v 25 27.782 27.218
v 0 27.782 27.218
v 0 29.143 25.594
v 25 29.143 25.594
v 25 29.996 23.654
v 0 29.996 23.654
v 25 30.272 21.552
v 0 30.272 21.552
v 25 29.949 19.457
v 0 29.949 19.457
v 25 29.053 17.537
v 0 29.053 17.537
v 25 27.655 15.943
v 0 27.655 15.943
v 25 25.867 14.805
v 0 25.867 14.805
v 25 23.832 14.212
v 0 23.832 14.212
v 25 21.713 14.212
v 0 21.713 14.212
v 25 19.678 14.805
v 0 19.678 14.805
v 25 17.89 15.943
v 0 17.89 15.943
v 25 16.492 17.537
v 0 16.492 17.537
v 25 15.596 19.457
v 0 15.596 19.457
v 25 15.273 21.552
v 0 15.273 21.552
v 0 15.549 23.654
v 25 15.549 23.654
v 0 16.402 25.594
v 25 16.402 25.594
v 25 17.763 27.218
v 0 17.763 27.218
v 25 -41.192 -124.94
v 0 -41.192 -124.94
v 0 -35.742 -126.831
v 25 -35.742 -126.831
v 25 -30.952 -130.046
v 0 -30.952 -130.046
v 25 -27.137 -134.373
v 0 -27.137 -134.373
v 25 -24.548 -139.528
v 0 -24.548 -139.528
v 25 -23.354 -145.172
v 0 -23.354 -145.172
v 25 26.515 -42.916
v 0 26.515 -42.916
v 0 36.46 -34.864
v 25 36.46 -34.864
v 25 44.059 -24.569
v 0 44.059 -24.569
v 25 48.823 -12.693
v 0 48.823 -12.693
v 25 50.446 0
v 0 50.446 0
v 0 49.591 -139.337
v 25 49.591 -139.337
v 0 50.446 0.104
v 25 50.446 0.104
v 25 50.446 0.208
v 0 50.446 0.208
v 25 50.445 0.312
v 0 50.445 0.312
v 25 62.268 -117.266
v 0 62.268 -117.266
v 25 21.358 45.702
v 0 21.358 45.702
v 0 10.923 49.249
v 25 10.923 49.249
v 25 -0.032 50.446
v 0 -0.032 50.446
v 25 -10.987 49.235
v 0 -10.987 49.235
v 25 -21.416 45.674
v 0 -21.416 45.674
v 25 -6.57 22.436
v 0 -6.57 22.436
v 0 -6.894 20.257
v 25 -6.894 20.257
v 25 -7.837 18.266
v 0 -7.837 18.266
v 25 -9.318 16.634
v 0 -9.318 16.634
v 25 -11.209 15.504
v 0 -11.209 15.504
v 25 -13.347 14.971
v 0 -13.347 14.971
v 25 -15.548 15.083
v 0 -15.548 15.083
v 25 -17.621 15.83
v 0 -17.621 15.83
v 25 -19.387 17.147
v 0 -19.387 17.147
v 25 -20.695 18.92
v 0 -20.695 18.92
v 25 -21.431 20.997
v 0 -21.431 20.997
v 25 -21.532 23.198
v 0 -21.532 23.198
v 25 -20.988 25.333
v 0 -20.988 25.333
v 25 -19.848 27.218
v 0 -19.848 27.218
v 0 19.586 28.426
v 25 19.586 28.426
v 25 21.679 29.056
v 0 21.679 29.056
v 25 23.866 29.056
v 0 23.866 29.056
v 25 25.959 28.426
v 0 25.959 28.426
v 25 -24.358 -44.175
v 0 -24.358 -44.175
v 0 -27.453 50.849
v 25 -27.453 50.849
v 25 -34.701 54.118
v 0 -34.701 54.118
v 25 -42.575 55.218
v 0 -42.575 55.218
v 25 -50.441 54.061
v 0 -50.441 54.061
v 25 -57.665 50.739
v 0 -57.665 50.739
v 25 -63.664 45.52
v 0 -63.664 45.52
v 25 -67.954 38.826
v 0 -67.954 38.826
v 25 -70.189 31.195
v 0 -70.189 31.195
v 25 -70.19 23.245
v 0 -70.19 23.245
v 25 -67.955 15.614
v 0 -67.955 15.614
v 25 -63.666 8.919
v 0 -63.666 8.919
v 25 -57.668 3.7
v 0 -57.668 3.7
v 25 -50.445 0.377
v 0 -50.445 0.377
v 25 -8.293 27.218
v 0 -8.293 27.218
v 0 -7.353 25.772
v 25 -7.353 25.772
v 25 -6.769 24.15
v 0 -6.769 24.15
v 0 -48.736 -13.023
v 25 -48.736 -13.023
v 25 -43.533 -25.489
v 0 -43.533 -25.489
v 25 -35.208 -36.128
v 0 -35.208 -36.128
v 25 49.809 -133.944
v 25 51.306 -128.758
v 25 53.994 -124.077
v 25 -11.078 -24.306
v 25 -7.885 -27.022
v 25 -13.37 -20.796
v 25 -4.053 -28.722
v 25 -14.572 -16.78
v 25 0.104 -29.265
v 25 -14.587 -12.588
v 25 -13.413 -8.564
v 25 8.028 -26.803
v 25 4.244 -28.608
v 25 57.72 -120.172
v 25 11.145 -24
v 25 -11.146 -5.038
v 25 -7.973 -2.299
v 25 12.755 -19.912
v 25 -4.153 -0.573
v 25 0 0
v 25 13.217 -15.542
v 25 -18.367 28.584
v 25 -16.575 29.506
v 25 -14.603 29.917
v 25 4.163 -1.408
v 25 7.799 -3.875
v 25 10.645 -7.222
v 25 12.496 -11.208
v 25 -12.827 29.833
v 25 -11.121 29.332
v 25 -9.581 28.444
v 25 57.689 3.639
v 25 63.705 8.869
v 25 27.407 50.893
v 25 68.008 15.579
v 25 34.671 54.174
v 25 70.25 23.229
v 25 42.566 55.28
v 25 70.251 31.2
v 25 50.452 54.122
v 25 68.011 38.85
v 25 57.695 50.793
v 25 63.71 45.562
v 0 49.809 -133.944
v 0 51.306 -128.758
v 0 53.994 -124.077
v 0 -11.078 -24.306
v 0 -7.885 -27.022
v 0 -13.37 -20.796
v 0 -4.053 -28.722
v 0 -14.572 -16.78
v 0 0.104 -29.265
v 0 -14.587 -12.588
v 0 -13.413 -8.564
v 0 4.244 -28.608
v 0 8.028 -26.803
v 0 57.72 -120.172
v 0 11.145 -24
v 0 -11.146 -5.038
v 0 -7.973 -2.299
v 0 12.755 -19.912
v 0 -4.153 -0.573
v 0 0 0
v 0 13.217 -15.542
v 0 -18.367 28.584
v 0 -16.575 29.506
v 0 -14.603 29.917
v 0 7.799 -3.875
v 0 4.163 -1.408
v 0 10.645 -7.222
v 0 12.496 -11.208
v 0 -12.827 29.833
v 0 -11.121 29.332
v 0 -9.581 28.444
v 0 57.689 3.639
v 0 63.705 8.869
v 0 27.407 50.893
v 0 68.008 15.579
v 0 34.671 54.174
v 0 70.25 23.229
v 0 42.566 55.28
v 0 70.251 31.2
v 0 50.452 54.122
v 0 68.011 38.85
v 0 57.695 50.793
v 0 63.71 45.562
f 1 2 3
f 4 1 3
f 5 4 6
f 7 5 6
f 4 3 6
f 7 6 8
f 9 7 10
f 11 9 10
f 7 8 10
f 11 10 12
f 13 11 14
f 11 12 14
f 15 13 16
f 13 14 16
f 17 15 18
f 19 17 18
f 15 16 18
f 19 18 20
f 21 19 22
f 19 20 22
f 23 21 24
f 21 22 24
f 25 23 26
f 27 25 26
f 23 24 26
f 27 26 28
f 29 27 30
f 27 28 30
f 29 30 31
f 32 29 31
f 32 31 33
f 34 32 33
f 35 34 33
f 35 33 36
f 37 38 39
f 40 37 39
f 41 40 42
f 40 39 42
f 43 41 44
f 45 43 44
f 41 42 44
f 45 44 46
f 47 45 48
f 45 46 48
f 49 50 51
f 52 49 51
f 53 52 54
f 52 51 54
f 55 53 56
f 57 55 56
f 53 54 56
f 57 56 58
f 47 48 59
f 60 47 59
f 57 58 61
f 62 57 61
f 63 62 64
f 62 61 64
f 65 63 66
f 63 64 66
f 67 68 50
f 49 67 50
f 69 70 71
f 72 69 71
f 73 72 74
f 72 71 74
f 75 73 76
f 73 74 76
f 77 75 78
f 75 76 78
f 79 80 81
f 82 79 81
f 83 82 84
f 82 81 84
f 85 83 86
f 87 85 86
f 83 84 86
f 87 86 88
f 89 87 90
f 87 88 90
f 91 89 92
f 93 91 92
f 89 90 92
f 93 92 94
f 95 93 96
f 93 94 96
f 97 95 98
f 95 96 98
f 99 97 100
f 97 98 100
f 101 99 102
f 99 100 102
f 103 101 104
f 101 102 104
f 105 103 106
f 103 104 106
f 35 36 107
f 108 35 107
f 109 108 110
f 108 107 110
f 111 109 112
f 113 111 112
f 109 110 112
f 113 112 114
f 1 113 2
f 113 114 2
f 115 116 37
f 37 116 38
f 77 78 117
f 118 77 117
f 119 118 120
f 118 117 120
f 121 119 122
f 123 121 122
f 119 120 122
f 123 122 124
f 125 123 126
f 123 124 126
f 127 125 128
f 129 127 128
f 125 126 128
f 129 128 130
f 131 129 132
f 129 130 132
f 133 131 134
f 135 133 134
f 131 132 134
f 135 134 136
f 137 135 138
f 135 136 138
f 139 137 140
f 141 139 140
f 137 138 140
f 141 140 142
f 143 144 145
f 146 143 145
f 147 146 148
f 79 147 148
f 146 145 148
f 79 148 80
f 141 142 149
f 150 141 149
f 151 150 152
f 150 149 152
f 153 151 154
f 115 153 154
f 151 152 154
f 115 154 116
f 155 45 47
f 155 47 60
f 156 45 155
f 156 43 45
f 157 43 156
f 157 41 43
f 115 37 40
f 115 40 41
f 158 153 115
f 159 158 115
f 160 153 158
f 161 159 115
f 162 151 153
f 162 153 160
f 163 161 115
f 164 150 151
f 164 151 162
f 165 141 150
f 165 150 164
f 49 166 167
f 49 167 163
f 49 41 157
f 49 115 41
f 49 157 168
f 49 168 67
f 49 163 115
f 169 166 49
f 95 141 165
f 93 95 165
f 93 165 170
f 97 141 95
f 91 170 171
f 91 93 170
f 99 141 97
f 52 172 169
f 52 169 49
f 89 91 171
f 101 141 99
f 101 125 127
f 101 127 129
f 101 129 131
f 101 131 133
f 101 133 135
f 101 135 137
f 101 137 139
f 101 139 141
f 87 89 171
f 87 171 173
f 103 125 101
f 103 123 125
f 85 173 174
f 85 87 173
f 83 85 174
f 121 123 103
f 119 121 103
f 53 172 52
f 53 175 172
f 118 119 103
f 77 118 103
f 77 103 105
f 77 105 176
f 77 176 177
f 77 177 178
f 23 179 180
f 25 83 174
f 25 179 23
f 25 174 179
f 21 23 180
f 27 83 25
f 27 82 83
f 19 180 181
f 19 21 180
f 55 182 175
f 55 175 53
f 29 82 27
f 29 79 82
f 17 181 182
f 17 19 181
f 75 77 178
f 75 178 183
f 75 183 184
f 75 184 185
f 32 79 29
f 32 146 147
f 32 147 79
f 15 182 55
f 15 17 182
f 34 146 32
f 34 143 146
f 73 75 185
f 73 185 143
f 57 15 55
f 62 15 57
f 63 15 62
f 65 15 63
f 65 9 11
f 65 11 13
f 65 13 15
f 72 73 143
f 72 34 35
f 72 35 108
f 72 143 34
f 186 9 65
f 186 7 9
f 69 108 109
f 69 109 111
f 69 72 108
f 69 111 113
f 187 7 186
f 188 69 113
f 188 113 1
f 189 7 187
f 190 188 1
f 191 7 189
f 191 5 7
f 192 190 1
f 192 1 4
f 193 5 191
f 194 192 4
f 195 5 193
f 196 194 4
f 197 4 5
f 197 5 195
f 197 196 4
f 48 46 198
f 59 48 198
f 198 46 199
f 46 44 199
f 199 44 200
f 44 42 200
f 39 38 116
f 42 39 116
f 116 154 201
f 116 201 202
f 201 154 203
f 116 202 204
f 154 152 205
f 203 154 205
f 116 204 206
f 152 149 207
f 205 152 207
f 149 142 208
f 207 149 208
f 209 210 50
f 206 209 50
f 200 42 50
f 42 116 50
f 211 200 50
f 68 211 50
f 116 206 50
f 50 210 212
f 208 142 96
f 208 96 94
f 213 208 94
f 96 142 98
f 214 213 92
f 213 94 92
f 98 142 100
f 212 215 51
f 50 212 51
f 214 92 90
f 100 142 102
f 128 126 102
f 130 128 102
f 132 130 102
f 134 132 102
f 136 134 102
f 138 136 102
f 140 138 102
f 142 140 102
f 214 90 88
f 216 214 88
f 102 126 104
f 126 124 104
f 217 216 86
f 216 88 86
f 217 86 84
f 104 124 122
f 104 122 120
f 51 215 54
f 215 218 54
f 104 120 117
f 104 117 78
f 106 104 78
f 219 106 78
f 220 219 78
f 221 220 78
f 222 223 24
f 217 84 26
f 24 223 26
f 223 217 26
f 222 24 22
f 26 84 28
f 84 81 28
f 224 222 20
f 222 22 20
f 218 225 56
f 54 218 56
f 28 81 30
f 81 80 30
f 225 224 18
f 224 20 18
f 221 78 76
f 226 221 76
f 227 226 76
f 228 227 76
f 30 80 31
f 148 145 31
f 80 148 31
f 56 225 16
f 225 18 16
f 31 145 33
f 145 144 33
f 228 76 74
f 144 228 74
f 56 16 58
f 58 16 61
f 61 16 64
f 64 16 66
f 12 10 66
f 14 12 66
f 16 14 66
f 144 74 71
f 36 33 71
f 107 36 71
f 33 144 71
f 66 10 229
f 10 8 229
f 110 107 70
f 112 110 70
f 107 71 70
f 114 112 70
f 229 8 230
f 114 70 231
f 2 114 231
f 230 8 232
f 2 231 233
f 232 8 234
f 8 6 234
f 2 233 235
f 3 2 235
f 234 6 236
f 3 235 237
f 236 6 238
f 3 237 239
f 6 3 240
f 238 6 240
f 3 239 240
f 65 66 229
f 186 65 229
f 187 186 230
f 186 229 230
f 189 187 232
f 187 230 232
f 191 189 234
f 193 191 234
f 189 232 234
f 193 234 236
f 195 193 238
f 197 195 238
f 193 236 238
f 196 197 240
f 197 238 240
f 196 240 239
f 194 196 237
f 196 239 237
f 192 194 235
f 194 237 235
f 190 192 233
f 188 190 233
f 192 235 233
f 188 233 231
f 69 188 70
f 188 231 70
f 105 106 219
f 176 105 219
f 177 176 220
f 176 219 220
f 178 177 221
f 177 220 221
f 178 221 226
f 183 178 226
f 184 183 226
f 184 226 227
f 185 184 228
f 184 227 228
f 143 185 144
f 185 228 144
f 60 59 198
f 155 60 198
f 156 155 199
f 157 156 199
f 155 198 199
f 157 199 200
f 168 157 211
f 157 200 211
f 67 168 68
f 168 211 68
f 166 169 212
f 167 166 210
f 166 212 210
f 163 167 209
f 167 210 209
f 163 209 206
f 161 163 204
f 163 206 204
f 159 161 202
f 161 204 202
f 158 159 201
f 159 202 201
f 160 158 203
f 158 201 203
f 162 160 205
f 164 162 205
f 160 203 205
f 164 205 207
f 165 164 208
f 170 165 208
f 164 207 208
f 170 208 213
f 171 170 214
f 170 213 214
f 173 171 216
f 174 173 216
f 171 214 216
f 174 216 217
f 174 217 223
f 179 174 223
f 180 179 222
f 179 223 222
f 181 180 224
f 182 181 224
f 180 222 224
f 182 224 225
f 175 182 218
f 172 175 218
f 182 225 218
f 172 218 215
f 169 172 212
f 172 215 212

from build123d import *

# Parameters (mm, degrees)
F1_DEPTH = 25


with BuildPart() as f1:
    # F0 (on Right) → F1 (new body)
    with BuildSketch(Plane.YZ):
        with BuildLine():
            Line((62.268494035, -117.2657224541), (26.5148173721, -42.9157082976))
            ThreePointArc((26.5148173721, -42.9157082976), (1.2487643575, -50.4304882639), (-24.3582585984, -44.1754320523))
            Line((-24.3582585984, -44.1754320523), (-41.1918519377, -124.9397814602))
            ThreePointArc((-41.1918519377, -124.9397814602), (-28.905337679, -132.0868997864), (-23.3544766233, -145.1722990748))
            Line((-23.3544766233, -145.1722990748), (49.5911414452, -139.3371221753))
            ThreePointArc((49.5911414452, -139.3371221753), (52.5088729266, -126.3365028199), (62.268494035, -117.2657224541))
        make_face()
        with BuildLine():
            ThreePointArc((26.5148173721, -42.9157082976), (44.0588165312, -24.5685621237), (50.4459469032, 0))
            ThreePointArc((50.4459469032, 0), (50.4457051903, 0.1561627636), (50.4449800541, 0.3123240306))
            ThreePointArc((50.4449800541, 0.3123240306), (48.3675580647, 14.3308368847), (42.4729821328, 27.2183641629))
            Line((42.4729821328, 27.2183641629), (27.7815824315, 27.2183641629))
            ThreePointArc((27.7815824315, 27.2183641629), (29.6215359729, 24.6926196845), (30.2725235865, 21.6363099275))
            ThreePointArc((30.2725235865, 21.6363099275), (19.7162138294, 14.7872975411), (17.7634647415, 27.2183641629))
            Line((17.7634647415, 27.2183641629), (-8.2927525458, 27.2183641629))
            ThreePointArc((-8.2927525458, 27.2183641629), (-7.0141543228, 24.9776791667), (-6.5704554783, 22.4362988324))
            ThreePointArc((-6.5704554783, 22.4362988324), (-16.6118358125, 15.379997677), (-19.8481584107, 27.2183641629))
            Line((-19.8481584107, 27.2183641629), (-42.4729821328, 27.2183641629))
            ThreePointArc((-42.4729821328, 27.2183641629), (-48.3583492389, 14.361880721), (-50.4445375277, 0.3770843017))
            ThreePointArc((-50.4445375277, 0.3770843017), (-43.5327032866, -25.4891605102), (-24.3582585984, -44.1754320523))
            ThreePointArc((-24.3582585984, -44.1754320523), (1.2487643575, -50.4304882639), (26.5148173721, -42.9157082976))
        make_face()
        with BuildLine():
            ThreePointArc((11.1447488889, -24.0004807711), (-13.3697300078, -20.7961057501), (0, 0))
            ThreePointArc((0, 0), (11.7053783119, -9.1523479333), (11.1447488889, -24.0004807711))
        make_face(mode=Mode.SUBTRACT)
        with BuildLine():
            Line((27.7815824315, 27.2183641629), (42.4729821328, 27.2183641629))
            ThreePointArc((42.4729821328, 27.2183641629), (33.2264505165, 37.9578258733), (21.3576968642, 45.7016667487))
            ThreePointArc((21.3576968642, 45.7016667487), (-0.0323808915, 50.4459365106), (-21.4163503965, 45.6742103889))
            ThreePointArc((-21.4163503965, 45.6742103889), (-33.2508085276, 37.9364902332), (-42.4729821328, 27.2183641629))
            Line((-42.4729821328, 27.2183641629), (-19.8481584107, 27.2183641629))
            ThreePointArc((-19.8481584107, 27.2183641629), (-17.5022305288, 29.105100824), (-14.6033657252, 29.9173419862))
            ThreePointArc((-14.6033657252, 29.9173419862), (-11.1212042341, 29.3320886421), (-8.2927525458, 27.2183641629))
            Line((-8.2927525458, 27.2183641629), (17.7634647415, 27.2183641629))
            ThreePointArc((17.7634647415, 27.2183641629), (22.7725235865, 29.1363099275), (27.7815824315, 27.2183641629))
        make_face()
        with BuildLine():
            ThreePointArc((-42.4729821328, 27.2183641629), (-33.2508085276, 37.9364902332), (-21.4163503965, 45.6742103889))
            ThreePointArc((-21.4163503965, 45.6742103889), (-66.0475916451, 42.3259048742), (-50.4445375277, 0.3770843017))
            ThreePointArc((-50.4445375277, 0.3770843017), (-48.3583492389, 14.361880721), (-42.4729821328, 27.2183641629))
        make_face()
        with BuildLine():
            ThreePointArc((42.4729821328, 27.2183641629), (48.3675580647, 14.3308368847), (50.4449800541, 0.3123240306))
            ThreePointArc((50.4449800541, 0.3123240306), (66.0999711215, 42.3594717111), (21.3576968642, 45.7016667487))
            ThreePointArc((21.3576968642, 45.7016667487), (33.2264505165, 37.9578258733), (42.4729821328, 27.2183641629))
        make_face()
    extrude(amount=F1_DEPTH)


solid = f1.part
